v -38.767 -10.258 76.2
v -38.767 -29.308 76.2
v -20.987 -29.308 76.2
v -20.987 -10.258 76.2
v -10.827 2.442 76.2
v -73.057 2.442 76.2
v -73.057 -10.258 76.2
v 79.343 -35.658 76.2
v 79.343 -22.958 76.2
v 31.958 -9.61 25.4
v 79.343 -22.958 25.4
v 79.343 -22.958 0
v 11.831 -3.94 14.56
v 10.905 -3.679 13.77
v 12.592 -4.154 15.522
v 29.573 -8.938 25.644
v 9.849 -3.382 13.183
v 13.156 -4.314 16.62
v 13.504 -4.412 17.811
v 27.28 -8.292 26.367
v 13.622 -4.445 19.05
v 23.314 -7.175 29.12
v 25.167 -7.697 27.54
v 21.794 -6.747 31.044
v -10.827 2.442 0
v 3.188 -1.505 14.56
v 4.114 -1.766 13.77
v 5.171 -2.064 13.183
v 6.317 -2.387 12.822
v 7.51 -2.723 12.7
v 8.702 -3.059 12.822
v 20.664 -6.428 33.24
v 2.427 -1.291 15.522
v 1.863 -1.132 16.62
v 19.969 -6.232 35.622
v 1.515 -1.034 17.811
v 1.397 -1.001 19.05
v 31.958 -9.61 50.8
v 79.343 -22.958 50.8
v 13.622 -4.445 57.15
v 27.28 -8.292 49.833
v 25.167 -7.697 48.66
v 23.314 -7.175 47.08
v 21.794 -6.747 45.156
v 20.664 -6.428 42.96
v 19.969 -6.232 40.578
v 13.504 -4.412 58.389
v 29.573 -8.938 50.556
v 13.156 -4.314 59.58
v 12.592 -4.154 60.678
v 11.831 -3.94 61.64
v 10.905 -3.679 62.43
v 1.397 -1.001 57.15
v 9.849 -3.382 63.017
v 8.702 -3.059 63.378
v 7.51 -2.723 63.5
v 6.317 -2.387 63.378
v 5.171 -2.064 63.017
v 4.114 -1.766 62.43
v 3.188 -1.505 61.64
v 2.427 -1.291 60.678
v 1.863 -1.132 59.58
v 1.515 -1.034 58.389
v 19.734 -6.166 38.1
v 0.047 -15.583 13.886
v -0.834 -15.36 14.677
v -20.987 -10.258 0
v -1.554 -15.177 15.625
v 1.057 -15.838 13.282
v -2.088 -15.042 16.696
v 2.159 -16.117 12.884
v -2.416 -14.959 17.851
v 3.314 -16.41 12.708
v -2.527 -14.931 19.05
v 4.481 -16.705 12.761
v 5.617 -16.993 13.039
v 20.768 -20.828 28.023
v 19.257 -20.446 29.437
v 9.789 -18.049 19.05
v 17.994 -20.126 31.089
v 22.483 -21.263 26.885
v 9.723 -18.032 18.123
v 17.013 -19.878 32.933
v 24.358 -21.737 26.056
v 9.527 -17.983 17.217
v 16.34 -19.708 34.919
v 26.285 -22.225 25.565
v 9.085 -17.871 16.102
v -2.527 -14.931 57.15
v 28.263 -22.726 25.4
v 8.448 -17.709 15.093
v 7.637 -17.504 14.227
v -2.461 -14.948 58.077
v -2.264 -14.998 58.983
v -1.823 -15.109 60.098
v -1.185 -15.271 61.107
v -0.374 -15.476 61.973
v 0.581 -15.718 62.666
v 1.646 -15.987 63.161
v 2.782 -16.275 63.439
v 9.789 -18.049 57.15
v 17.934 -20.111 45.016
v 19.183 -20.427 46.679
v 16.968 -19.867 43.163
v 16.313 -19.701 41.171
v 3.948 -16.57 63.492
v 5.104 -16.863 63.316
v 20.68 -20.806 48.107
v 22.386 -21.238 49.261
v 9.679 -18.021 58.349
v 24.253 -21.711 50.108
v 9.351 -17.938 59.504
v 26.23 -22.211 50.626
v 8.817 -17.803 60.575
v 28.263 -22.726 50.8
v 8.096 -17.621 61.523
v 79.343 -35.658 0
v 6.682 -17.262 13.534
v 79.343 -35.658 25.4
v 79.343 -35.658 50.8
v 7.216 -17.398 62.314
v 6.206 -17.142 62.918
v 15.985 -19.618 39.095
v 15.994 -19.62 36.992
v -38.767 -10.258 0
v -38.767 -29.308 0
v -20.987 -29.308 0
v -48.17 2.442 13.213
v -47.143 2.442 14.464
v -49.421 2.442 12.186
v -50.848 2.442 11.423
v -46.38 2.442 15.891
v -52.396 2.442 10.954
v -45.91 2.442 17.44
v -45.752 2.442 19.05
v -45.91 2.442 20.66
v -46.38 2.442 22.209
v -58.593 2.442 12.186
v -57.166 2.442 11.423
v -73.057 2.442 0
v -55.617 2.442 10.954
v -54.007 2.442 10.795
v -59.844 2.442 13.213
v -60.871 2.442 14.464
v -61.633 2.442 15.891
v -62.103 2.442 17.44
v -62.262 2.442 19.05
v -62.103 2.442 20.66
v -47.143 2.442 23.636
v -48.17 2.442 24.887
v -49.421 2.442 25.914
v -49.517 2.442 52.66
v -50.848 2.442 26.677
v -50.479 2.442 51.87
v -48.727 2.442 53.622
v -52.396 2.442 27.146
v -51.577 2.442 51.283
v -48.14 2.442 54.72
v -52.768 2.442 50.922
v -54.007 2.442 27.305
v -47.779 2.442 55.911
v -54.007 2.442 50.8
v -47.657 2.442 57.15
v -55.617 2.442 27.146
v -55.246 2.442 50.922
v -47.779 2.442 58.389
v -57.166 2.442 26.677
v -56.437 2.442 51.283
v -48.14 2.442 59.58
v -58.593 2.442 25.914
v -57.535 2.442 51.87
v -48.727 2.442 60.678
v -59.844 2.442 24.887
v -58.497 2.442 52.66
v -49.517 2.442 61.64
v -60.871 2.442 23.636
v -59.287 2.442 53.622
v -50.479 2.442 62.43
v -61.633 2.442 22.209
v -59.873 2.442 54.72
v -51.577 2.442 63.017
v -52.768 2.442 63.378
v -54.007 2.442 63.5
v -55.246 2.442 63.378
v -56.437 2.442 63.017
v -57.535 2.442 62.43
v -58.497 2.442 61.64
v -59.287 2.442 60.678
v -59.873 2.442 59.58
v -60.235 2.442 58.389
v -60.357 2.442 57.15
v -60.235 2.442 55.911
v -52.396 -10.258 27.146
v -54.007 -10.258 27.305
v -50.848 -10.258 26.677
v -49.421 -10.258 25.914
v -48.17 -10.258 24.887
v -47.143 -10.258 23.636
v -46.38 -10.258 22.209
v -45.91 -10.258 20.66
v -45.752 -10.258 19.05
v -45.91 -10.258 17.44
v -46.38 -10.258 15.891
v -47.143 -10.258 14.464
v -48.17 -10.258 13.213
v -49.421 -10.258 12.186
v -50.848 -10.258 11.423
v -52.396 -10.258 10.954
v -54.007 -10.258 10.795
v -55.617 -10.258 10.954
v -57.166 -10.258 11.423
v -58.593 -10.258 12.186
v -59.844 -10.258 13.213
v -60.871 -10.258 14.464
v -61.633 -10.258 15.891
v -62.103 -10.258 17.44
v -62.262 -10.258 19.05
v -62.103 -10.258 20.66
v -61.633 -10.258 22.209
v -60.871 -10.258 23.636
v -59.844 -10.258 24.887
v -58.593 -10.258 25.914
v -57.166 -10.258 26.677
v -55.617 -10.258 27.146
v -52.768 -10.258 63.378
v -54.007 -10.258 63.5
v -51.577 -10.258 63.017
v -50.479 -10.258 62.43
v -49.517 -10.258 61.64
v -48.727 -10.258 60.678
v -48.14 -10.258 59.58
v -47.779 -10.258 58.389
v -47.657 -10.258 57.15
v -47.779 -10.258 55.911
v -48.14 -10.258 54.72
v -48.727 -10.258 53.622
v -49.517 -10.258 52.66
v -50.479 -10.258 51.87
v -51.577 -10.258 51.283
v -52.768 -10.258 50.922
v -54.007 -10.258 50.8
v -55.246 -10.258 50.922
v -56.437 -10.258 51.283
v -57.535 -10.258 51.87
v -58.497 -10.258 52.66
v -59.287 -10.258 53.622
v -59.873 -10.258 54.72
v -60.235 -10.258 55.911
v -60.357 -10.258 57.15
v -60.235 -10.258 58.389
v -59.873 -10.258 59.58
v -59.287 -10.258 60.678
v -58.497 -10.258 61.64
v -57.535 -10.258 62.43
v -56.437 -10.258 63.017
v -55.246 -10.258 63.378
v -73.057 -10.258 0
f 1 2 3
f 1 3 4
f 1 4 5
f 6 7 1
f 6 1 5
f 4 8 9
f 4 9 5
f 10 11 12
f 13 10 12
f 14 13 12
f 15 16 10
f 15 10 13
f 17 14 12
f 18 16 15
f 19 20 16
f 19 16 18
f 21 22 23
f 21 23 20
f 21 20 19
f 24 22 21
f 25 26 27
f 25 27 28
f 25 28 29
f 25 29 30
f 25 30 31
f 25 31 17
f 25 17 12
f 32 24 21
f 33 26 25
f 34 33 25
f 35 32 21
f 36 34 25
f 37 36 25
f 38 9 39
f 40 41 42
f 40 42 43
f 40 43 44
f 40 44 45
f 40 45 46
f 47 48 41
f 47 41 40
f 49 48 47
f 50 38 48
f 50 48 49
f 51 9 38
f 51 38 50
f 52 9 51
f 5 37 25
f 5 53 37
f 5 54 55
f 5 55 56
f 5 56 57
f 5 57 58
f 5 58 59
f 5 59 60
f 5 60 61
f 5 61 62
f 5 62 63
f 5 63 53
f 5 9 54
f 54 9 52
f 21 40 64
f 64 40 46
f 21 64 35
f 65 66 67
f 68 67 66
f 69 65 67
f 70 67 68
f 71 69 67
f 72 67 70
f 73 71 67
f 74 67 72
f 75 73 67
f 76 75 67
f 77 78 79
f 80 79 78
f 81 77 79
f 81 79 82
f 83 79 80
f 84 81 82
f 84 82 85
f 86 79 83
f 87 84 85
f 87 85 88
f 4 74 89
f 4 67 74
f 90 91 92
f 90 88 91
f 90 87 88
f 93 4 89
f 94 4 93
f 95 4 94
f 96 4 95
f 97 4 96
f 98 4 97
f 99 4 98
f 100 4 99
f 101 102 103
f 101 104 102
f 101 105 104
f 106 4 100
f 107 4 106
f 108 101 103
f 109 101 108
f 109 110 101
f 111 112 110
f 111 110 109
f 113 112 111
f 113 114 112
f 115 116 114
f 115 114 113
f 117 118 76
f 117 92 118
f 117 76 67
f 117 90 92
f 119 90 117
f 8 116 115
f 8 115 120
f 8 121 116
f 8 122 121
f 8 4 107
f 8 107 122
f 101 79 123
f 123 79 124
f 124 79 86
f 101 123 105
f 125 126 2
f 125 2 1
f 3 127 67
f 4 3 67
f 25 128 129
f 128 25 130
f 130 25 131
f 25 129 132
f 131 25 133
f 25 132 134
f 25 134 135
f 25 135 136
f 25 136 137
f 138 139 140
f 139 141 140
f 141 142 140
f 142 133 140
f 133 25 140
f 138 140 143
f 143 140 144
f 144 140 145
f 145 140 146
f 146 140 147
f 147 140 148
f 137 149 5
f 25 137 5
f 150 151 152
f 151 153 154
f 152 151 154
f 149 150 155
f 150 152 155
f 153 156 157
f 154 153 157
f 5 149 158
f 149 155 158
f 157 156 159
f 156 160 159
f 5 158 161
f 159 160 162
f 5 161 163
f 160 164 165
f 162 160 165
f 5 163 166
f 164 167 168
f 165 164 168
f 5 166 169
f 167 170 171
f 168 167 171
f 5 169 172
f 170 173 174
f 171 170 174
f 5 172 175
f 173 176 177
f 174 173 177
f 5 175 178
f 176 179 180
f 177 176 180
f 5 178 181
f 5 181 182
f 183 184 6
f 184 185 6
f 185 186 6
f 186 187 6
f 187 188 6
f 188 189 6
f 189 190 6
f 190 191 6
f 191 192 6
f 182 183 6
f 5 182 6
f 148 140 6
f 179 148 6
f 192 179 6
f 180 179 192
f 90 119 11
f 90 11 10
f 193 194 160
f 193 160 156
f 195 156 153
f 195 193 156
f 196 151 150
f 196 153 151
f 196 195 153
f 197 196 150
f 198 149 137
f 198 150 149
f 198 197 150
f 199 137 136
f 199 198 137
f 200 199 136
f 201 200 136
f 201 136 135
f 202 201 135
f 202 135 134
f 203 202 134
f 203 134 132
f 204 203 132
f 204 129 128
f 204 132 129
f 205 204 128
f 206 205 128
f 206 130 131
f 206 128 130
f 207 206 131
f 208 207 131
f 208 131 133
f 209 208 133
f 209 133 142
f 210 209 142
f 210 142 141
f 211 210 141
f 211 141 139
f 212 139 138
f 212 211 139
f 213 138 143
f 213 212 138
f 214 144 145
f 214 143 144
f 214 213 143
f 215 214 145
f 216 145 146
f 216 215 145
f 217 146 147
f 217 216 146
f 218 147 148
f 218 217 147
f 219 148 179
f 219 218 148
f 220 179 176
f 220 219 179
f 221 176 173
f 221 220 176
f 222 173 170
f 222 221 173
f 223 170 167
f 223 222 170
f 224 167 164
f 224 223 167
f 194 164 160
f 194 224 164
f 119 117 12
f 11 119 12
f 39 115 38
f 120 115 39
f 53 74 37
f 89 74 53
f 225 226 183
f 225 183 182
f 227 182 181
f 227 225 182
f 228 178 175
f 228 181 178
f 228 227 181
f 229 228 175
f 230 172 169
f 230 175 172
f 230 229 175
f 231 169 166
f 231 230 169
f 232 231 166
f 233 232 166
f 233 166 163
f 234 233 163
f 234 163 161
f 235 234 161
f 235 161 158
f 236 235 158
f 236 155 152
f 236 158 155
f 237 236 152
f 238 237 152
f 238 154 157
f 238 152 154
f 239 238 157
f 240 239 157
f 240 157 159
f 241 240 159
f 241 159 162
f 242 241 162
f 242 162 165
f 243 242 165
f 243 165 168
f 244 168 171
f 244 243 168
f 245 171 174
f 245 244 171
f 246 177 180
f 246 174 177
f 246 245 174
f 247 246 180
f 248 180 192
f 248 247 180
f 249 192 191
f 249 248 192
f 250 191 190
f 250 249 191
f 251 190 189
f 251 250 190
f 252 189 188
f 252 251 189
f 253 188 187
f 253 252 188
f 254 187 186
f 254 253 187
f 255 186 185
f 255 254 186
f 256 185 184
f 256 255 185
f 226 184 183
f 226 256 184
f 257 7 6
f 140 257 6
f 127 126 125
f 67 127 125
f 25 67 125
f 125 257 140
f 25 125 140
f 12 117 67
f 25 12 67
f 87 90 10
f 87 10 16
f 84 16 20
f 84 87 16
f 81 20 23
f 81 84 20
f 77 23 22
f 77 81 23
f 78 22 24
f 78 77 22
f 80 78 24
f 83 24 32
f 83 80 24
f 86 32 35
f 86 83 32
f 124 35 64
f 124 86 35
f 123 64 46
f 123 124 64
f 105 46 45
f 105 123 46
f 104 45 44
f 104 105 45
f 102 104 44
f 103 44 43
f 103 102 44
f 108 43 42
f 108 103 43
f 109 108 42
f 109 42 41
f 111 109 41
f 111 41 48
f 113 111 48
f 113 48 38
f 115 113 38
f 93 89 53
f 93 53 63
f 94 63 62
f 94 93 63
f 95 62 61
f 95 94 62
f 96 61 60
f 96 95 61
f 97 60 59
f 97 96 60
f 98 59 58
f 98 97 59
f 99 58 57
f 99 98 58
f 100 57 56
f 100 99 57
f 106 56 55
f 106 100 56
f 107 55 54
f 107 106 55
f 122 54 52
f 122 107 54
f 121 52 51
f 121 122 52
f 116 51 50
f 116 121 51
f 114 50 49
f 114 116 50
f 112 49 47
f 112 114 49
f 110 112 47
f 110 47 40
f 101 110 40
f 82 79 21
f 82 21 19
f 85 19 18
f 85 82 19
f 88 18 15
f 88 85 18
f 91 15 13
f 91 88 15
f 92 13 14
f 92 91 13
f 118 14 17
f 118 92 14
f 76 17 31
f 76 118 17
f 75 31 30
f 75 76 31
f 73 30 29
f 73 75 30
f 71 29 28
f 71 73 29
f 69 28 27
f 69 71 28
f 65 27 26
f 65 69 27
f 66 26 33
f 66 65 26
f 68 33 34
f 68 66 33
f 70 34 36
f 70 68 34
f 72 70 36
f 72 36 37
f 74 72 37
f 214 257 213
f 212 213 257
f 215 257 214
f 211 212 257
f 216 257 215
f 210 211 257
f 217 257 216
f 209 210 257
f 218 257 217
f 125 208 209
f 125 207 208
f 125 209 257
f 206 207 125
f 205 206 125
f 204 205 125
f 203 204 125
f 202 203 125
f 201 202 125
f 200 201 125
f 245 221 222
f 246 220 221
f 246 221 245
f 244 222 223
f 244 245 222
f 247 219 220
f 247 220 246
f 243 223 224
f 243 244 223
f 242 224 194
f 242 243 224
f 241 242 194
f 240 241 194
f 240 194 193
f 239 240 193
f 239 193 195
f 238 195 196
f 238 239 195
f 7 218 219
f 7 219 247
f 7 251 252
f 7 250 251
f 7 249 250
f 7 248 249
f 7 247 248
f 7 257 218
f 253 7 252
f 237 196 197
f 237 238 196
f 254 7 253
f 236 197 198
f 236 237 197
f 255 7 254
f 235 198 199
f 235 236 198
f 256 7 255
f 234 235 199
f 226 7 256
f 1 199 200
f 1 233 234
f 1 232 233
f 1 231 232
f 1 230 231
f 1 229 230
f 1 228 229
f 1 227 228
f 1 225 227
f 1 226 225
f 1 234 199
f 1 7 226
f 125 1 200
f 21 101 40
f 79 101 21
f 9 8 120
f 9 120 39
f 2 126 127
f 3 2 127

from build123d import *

# Parameters (mm, degrees)
BOSS_EXTRUDE1_START     = -73.056856187
BOSS_EXTRUDE1_OUTLINE_W = 38.1
BOSS_EXTRUDE1_OUTLINE_H = 76.2
BOSS_EXTRUDE1_DEPTH     = 152.4
SKETCH3_W               = 34.29
SKETCH3_H               = 25.4
CUT_EXTRUDE1_DEPTH      = 116.642749409
SKETCH4_W               = 17.78
SKETCH4_H               = 6.35
CUT_EXTRUDE2_DEPTH      = 116.642749409
CUT_EXTRUDE3_DEPTH      = 116.642749409
CUT_EXTRUDE4_DEPTH      = 116.642749409
CUT_EXTRUDE5_DEPTH      = 116.642749409
CUT_EXTRUDE5_DEPTH_BACK = 116.642749409
SKETCH8_R               = 6.35
CUT_EXTRUDE6_DEPTH      = 117.419003905
CUT_EXTRUDE6_DEPTH_BACK = 117.419003905
SKETCH11_R              = 8.255
CUT_EXTRUDE7_DEPTH      = 116.579441005
CUT_EXTRUDE7_DEPTH_BACK = 116.579441005
CUT_EXTRUDE9_DEPTH      = 116.579441005
CUT_EXTRUDE9_DEPTH_BACK = 116.579441005
SKETCH14_W              = 3.443454538
SKETCH14_H              = 25.4


# Read off the part's stored shape, not the designer's step: Boss-Extrude1
with BuildPart() as part:
    # Boss-Extrude1 outline → Boss-Extrude1 (new body)
    with BuildSketch(Plane.YZ.offset(BOSS_EXTRUDE1_START)):
        with Locations((-16.607692308, 38.1)):
            Rectangle(BOSS_EXTRUDE1_OUTLINE_W, BOSS_EXTRUDE1_OUTLINE_H)
    extrude(amount=BOSS_EXTRUDE1_DEPTH)

    # Sketch3 → Cut-Extrude1 (cut, through all)
    with BuildSketch(Plane.XY.offset(76.2)):
        with Locations((-55.911856187, -22.957692308)):
            Rectangle(SKETCH3_W, SKETCH3_H)
    extrude(amount=-CUT_EXTRUDE1_DEPTH, mode=Mode.SUBTRACT)

    # Sketch4 → Cut-Extrude2 (cut, through all)
    with BuildSketch(Plane.XY.offset(76.2)):
        with Locations((-29.876856187, -32.482692308)):
            Rectangle(SKETCH4_W, SKETCH4_H)
    extrude(amount=-CUT_EXTRUDE2_DEPTH, mode=Mode.SUBTRACT)

    # Sketch5 → Cut-Extrude3 (cut, through all)
    with BuildSketch(Plane.XY.offset(76.2)):
        Polygon((-20.986856187, -35.657692308), (-20.986856187, -10.257692308), (79.343143813, -35.657692308), align=None)
    extrude(amount=-CUT_EXTRUDE3_DEPTH, mode=Mode.SUBTRACT)

    # Sketch6 → Cut-Extrude4 (cut, through all)
    with BuildSketch(Plane.XY.offset(76.2)):
        Polygon((79.343143813, 2.442307692), (79.343143813, -22.957692308), (-10.826856187, 2.442307692), align=None)
    extrude(amount=-CUT_EXTRUDE4_DEPTH, mode=Mode.SUBTRACT)

    # Sketch8 → Cut-Extrude5 (cut, two sides: drawn at the far end of the back side and taken through both)
    with BuildSketch(Plane(origin=(0, 0, 0), x_dir=(1, 0, 0), z_dir=(0, 1, 0)).offset(-CUT_EXTRUDE5_DEPTH_BACK)):
        with Locations(Location((-54.006856187, -57.15, 0), (0, 0, 270))):
            Circle(SKETCH8_R)
    extrude(amount=CUT_EXTRUDE5_DEPTH + CUT_EXTRUDE5_DEPTH_BACK, mode=Mode.SUBTRACT)

    # Sketch11 → Cut-Extrude6 (cut, two sides: drawn at the far end of the back side and taken through both)
    with BuildSketch(Plane(origin=(0, 2.442307692, 0), x_dir=(1, 0, 0), z_dir=(0, 1, 0)).offset(-CUT_EXTRUDE6_DEPTH_BACK)):
        with Locations(Location((-54.006856187, -19.05, 0), (0, 0, 270))):
            Circle(SKETCH11_R)
    extrude(amount=CUT_EXTRUDE6_DEPTH + CUT_EXTRUDE6_DEPTH_BACK, mode=Mode.SUBTRACT)

    # Sketch12 → Cut-Extrude7 (cut, two sides: drawn at the far end of the back side and taken through both)
    with BuildSketch(Plane(origin=(-0.158549081, -0.562849239, 0), x_dir=(0.9625404418449637, -0.2711381526323841, 0), z_dir=(0.27113815263238417, 0.9625404418449638, 0)).offset(-CUT_EXTRUDE7_DEPTH_BACK)):
        with BuildLine():
            ThreePointArc((14.316510266, -19.05), (7.966510266, -25.4), (1.616510266, -19.05))
            Line((1.616510266, -19.05), (1.616510266, -57.15))
            ThreePointArc((1.616510266, -57.15), (7.966510266, -50.8), (14.316510266, -57.15))
            Line((14.316510266, -57.15), (14.316510266, -19.05))
        make_face()
        with BuildLine():
            ThreePointArc((14.316510266, -19.05), (7.966510266, -12.7), (1.616510266, -19.05))
            Line((1.616510266, -19.05), (14.316510266, -19.05))
        make_face()
        with BuildLine():
            Line((14.316510266, -19.05), (1.616510266, -19.05))
            ThreePointArc((1.616510266, -19.05), (7.966510266, -25.4), (14.316510266, -19.05))
        make_face()
        with BuildLine():
            ThreePointArc((14.316510266, -57.15), (7.966510266, -50.8), (1.616510266, -57.15))
            Line((1.616510266, -57.15), (14.316510266, -57.15))
        make_face()
        with BuildLine():
            Line((14.316510266, -57.15), (1.616510266, -57.15))
            ThreePointArc((1.616510266, -57.15), (7.966510266, -63.5), (14.316510266, -57.15))
        make_face()
    extrude(amount=CUT_EXTRUDE7_DEPTH + CUT_EXTRUDE7_DEPTH_BACK, mode=Mode.SUBTRACT)

    # Sketch14 → Cut-Extrude9 (cut, two sides: drawn at the far end of the back side and taken through both)
    with BuildSketch(Plane(origin=(-0.158549081, -0.562849239, 0), x_dir=(0.9625404418449637, -0.2711381526323841, 0), z_dir=(0.27113815263238417, 0.9625404418449638, 0)).offset(-CUT_EXTRUDE9_DEPTH_BACK)):
        with Locations((84.317418253, -38.1)):
            Rectangle(SKETCH14_W, SKETCH14_H)
        with BuildLine():
            Line((82.595690984, -25.4), (33.366510266, -25.4))
            ThreePointArc((33.366510266, -25.4), (42.346766387, -29.119743879), (46.066510266, -38.1))
            ThreePointArc((46.066510266, -38.1), (42.346766387, -47.080256121), (33.366510266, -50.8))
            Line((33.366510266, -50.8), (82.595690984, -50.8))
            Line((82.595690984, -50.8), (82.595690984, -25.4))
        make_face()
        with BuildLine():
            ThreePointArc((46.066510266, -38.1), (42.346766387, -29.119743879), (33.366510266, -25.4))
            Line((33.366510266, -25.4), (33.366510266, -50.8))
            ThreePointArc((33.366510266, -50.8), (42.346766387, -47.080256121), (46.066510266, -38.1))
        make_face()
        with BuildLine():
            Line((33.366510266, -50.8), (33.366510266, -25.4))
            ThreePointArc((33.366510266, -25.4), (20.666510266, -38.1), (33.366510266, -50.8))
        make_face()
    extrude(amount=CUT_EXTRUDE9_DEPTH + CUT_EXTRUDE9_DEPTH_BACK, mode=Mode.SUBTRACT)


solid = part.part
